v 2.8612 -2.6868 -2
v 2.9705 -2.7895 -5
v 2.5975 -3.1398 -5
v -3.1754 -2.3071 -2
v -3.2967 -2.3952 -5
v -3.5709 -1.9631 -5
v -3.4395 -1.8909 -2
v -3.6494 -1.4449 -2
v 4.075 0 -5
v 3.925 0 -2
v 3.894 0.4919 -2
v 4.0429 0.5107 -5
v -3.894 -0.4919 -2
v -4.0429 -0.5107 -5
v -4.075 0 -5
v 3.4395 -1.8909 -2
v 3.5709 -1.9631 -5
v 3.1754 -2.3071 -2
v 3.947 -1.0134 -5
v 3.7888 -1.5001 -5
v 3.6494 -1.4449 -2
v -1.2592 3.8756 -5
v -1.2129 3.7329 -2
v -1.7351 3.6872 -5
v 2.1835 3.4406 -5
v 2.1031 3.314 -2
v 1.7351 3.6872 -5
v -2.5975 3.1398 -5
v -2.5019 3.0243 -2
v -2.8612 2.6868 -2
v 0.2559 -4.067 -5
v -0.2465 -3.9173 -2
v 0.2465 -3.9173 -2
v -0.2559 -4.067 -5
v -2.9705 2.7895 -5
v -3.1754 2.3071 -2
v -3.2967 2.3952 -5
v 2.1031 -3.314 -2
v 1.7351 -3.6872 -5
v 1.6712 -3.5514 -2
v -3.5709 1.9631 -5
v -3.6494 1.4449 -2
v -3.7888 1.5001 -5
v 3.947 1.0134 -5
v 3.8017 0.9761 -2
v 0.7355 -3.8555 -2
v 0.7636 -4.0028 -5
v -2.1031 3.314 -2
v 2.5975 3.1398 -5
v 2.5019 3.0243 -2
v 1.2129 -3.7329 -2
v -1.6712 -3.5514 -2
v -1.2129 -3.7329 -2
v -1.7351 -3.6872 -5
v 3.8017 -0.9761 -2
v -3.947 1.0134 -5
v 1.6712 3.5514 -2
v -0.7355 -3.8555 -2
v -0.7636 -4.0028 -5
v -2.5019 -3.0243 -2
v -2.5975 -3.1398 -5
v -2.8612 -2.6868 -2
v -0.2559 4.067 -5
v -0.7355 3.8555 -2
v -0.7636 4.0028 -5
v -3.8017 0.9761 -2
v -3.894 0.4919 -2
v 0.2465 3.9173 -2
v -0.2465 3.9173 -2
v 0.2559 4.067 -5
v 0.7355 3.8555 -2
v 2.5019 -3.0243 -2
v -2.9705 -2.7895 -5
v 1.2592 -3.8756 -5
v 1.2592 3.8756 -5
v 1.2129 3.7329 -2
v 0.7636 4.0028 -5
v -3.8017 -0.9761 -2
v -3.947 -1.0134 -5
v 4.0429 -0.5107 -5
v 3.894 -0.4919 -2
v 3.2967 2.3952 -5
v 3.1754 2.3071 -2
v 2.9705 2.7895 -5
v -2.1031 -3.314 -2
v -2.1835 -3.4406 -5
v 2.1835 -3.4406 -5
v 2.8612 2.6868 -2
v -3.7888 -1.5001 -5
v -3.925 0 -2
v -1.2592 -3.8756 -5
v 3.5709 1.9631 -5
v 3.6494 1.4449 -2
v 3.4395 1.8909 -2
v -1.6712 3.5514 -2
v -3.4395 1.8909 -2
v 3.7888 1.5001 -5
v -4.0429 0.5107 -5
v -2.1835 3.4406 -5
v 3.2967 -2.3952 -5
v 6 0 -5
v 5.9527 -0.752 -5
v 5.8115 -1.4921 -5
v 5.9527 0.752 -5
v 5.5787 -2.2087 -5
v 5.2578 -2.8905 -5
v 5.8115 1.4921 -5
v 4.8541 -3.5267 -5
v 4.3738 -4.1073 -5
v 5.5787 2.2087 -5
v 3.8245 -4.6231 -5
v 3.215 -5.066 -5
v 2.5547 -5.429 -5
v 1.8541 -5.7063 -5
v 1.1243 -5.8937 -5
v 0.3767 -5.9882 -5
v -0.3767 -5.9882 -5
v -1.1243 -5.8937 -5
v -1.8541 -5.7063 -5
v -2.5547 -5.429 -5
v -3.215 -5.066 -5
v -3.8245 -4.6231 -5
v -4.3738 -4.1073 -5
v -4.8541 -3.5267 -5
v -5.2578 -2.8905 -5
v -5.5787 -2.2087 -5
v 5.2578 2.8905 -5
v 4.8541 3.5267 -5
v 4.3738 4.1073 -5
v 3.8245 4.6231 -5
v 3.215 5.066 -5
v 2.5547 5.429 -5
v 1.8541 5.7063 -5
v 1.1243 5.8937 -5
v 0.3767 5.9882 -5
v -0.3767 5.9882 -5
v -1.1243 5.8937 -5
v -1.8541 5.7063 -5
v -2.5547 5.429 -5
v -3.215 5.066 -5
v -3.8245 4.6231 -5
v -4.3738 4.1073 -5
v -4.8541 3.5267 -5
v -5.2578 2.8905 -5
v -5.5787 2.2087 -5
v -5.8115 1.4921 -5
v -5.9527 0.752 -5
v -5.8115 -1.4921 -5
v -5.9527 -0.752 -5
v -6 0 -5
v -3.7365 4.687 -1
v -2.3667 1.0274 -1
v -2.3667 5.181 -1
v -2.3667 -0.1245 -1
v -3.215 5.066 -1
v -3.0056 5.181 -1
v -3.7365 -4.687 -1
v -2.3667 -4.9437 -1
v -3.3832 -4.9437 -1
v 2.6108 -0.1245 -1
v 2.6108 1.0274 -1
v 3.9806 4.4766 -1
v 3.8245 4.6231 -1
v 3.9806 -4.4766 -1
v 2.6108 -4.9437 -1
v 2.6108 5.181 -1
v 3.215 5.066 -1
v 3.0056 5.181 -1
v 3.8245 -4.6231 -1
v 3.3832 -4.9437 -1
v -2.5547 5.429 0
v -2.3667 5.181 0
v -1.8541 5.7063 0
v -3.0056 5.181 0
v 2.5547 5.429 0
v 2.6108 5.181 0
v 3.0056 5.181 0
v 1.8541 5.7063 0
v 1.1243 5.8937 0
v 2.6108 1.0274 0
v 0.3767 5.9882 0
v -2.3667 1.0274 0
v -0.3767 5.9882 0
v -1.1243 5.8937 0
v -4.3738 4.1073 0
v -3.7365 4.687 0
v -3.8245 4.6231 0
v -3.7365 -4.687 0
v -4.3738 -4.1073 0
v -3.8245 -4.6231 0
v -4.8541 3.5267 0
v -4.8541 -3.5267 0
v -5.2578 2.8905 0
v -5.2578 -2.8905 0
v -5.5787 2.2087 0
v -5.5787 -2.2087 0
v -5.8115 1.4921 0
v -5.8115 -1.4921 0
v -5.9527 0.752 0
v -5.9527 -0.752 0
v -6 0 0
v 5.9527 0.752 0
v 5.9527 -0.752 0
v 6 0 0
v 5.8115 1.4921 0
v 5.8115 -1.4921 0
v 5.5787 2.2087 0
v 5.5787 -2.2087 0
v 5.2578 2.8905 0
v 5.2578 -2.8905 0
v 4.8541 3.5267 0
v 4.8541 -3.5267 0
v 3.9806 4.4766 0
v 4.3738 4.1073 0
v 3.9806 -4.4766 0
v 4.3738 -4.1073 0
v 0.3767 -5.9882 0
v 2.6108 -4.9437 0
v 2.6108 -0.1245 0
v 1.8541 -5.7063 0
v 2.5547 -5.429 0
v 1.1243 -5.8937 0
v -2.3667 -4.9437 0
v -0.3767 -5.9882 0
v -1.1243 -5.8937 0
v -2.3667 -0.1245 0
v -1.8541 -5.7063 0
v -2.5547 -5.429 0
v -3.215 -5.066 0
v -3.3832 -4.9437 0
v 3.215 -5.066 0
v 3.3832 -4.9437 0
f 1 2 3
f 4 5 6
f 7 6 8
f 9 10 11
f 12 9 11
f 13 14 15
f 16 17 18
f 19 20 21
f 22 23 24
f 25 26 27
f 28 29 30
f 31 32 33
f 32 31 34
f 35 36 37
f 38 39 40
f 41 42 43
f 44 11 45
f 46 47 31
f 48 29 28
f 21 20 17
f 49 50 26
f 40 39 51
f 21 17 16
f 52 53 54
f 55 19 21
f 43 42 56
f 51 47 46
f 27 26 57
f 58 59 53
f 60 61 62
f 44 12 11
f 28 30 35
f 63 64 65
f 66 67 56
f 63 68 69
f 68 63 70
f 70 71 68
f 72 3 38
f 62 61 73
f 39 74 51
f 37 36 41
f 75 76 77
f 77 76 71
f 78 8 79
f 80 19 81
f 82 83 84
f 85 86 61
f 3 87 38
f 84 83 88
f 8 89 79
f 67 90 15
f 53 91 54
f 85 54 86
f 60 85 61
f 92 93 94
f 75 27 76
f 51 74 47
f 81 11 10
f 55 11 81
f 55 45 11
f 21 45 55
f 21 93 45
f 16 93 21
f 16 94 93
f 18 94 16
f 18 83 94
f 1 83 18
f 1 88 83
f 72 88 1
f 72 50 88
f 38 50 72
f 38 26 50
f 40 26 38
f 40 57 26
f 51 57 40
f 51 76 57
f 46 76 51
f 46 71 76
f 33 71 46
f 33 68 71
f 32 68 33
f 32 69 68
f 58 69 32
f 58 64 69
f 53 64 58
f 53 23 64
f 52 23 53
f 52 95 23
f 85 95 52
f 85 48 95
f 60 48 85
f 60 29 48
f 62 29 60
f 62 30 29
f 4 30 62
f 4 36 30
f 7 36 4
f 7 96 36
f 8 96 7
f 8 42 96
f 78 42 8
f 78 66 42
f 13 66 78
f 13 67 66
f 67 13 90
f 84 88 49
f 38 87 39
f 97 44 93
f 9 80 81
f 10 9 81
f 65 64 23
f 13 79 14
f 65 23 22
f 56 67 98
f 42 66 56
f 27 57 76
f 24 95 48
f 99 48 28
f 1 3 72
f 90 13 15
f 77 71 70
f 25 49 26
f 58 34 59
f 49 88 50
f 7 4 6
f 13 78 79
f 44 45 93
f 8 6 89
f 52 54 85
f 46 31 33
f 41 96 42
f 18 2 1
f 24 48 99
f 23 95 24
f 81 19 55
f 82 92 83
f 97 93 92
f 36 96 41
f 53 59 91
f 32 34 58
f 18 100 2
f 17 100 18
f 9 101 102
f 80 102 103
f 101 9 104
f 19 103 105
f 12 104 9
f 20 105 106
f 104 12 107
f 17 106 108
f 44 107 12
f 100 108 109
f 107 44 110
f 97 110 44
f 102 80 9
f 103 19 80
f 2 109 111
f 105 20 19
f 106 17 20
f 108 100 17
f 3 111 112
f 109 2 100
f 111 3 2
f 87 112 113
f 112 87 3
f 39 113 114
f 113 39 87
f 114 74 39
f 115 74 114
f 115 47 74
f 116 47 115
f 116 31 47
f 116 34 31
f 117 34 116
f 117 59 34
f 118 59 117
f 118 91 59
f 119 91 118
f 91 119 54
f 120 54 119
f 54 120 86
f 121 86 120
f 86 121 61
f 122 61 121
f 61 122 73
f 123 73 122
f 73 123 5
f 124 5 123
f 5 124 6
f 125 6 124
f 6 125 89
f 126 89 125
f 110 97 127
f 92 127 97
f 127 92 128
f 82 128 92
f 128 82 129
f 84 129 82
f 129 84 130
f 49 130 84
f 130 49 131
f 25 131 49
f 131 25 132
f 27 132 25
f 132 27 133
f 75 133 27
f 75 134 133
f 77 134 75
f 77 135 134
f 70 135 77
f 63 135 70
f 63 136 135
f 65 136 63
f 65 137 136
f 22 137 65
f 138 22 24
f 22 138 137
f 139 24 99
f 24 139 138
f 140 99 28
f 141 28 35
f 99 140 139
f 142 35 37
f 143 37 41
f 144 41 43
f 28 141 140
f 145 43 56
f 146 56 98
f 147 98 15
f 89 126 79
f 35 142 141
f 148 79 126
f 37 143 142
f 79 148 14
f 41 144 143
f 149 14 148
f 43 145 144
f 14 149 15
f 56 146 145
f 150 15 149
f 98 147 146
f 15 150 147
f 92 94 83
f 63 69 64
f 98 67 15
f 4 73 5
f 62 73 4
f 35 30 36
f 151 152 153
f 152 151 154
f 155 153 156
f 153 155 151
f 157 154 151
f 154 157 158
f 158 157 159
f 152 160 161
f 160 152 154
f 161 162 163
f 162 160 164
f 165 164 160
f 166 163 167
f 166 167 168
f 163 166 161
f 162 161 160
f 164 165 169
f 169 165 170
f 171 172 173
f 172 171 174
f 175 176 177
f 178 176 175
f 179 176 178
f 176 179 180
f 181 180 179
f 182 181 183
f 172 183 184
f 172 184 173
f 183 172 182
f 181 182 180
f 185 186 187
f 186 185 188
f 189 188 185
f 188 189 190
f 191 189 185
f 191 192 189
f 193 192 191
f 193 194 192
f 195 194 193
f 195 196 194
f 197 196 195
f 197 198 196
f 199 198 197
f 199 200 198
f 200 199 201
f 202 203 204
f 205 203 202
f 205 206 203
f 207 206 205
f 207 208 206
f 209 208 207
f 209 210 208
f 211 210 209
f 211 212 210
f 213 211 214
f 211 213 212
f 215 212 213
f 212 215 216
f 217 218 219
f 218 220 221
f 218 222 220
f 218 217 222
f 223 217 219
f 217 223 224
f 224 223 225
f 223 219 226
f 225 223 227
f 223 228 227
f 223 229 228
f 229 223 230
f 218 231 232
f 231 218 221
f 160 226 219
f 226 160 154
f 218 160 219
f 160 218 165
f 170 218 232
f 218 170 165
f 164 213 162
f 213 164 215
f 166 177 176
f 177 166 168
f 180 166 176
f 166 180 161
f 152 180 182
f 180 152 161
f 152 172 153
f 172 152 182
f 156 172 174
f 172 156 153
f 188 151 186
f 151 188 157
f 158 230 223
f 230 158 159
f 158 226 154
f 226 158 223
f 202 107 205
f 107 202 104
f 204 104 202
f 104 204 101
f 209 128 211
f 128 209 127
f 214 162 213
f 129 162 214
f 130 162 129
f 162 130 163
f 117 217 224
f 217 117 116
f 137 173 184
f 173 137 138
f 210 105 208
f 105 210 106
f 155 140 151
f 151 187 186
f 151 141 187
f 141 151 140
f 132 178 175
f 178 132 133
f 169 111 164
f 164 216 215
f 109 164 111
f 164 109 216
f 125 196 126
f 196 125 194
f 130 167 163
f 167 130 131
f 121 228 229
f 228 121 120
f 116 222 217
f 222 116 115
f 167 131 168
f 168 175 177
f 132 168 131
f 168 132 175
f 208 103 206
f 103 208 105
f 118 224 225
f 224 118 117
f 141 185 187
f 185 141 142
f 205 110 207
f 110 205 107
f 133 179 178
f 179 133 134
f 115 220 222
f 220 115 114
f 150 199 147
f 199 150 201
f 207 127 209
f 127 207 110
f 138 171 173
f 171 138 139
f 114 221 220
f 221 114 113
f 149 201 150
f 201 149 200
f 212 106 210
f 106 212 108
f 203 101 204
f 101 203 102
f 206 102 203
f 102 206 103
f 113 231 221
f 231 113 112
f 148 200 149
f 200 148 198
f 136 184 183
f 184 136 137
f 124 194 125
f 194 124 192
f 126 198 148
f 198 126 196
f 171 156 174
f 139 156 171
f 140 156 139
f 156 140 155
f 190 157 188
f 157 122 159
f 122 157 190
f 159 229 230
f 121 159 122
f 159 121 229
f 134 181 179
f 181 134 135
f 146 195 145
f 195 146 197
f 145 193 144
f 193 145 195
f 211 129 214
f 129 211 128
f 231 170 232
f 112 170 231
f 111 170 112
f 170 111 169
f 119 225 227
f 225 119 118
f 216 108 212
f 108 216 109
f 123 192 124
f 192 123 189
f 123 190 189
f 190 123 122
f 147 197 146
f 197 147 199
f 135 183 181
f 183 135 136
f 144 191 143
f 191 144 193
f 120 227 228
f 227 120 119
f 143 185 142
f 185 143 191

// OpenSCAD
$fn = 50;

difference() {
	union() {
		translate(v = [0, 0, -5.0]) {
			cylinder(h = 5, r = 6.0);
		}
	}
	union() {
		#translate(v = [0, 0, -5.0]) {
			cylinder(h = 3, r1 = 4.075, r2 = 3.925);
		}
		translate(v = [0, 0, -1]) {
			linear_extrude(height = 1) {
				text(font = "Impact", halign = "center", size = 10, text = "H", valign = "center");
			}
		}
	}
}
